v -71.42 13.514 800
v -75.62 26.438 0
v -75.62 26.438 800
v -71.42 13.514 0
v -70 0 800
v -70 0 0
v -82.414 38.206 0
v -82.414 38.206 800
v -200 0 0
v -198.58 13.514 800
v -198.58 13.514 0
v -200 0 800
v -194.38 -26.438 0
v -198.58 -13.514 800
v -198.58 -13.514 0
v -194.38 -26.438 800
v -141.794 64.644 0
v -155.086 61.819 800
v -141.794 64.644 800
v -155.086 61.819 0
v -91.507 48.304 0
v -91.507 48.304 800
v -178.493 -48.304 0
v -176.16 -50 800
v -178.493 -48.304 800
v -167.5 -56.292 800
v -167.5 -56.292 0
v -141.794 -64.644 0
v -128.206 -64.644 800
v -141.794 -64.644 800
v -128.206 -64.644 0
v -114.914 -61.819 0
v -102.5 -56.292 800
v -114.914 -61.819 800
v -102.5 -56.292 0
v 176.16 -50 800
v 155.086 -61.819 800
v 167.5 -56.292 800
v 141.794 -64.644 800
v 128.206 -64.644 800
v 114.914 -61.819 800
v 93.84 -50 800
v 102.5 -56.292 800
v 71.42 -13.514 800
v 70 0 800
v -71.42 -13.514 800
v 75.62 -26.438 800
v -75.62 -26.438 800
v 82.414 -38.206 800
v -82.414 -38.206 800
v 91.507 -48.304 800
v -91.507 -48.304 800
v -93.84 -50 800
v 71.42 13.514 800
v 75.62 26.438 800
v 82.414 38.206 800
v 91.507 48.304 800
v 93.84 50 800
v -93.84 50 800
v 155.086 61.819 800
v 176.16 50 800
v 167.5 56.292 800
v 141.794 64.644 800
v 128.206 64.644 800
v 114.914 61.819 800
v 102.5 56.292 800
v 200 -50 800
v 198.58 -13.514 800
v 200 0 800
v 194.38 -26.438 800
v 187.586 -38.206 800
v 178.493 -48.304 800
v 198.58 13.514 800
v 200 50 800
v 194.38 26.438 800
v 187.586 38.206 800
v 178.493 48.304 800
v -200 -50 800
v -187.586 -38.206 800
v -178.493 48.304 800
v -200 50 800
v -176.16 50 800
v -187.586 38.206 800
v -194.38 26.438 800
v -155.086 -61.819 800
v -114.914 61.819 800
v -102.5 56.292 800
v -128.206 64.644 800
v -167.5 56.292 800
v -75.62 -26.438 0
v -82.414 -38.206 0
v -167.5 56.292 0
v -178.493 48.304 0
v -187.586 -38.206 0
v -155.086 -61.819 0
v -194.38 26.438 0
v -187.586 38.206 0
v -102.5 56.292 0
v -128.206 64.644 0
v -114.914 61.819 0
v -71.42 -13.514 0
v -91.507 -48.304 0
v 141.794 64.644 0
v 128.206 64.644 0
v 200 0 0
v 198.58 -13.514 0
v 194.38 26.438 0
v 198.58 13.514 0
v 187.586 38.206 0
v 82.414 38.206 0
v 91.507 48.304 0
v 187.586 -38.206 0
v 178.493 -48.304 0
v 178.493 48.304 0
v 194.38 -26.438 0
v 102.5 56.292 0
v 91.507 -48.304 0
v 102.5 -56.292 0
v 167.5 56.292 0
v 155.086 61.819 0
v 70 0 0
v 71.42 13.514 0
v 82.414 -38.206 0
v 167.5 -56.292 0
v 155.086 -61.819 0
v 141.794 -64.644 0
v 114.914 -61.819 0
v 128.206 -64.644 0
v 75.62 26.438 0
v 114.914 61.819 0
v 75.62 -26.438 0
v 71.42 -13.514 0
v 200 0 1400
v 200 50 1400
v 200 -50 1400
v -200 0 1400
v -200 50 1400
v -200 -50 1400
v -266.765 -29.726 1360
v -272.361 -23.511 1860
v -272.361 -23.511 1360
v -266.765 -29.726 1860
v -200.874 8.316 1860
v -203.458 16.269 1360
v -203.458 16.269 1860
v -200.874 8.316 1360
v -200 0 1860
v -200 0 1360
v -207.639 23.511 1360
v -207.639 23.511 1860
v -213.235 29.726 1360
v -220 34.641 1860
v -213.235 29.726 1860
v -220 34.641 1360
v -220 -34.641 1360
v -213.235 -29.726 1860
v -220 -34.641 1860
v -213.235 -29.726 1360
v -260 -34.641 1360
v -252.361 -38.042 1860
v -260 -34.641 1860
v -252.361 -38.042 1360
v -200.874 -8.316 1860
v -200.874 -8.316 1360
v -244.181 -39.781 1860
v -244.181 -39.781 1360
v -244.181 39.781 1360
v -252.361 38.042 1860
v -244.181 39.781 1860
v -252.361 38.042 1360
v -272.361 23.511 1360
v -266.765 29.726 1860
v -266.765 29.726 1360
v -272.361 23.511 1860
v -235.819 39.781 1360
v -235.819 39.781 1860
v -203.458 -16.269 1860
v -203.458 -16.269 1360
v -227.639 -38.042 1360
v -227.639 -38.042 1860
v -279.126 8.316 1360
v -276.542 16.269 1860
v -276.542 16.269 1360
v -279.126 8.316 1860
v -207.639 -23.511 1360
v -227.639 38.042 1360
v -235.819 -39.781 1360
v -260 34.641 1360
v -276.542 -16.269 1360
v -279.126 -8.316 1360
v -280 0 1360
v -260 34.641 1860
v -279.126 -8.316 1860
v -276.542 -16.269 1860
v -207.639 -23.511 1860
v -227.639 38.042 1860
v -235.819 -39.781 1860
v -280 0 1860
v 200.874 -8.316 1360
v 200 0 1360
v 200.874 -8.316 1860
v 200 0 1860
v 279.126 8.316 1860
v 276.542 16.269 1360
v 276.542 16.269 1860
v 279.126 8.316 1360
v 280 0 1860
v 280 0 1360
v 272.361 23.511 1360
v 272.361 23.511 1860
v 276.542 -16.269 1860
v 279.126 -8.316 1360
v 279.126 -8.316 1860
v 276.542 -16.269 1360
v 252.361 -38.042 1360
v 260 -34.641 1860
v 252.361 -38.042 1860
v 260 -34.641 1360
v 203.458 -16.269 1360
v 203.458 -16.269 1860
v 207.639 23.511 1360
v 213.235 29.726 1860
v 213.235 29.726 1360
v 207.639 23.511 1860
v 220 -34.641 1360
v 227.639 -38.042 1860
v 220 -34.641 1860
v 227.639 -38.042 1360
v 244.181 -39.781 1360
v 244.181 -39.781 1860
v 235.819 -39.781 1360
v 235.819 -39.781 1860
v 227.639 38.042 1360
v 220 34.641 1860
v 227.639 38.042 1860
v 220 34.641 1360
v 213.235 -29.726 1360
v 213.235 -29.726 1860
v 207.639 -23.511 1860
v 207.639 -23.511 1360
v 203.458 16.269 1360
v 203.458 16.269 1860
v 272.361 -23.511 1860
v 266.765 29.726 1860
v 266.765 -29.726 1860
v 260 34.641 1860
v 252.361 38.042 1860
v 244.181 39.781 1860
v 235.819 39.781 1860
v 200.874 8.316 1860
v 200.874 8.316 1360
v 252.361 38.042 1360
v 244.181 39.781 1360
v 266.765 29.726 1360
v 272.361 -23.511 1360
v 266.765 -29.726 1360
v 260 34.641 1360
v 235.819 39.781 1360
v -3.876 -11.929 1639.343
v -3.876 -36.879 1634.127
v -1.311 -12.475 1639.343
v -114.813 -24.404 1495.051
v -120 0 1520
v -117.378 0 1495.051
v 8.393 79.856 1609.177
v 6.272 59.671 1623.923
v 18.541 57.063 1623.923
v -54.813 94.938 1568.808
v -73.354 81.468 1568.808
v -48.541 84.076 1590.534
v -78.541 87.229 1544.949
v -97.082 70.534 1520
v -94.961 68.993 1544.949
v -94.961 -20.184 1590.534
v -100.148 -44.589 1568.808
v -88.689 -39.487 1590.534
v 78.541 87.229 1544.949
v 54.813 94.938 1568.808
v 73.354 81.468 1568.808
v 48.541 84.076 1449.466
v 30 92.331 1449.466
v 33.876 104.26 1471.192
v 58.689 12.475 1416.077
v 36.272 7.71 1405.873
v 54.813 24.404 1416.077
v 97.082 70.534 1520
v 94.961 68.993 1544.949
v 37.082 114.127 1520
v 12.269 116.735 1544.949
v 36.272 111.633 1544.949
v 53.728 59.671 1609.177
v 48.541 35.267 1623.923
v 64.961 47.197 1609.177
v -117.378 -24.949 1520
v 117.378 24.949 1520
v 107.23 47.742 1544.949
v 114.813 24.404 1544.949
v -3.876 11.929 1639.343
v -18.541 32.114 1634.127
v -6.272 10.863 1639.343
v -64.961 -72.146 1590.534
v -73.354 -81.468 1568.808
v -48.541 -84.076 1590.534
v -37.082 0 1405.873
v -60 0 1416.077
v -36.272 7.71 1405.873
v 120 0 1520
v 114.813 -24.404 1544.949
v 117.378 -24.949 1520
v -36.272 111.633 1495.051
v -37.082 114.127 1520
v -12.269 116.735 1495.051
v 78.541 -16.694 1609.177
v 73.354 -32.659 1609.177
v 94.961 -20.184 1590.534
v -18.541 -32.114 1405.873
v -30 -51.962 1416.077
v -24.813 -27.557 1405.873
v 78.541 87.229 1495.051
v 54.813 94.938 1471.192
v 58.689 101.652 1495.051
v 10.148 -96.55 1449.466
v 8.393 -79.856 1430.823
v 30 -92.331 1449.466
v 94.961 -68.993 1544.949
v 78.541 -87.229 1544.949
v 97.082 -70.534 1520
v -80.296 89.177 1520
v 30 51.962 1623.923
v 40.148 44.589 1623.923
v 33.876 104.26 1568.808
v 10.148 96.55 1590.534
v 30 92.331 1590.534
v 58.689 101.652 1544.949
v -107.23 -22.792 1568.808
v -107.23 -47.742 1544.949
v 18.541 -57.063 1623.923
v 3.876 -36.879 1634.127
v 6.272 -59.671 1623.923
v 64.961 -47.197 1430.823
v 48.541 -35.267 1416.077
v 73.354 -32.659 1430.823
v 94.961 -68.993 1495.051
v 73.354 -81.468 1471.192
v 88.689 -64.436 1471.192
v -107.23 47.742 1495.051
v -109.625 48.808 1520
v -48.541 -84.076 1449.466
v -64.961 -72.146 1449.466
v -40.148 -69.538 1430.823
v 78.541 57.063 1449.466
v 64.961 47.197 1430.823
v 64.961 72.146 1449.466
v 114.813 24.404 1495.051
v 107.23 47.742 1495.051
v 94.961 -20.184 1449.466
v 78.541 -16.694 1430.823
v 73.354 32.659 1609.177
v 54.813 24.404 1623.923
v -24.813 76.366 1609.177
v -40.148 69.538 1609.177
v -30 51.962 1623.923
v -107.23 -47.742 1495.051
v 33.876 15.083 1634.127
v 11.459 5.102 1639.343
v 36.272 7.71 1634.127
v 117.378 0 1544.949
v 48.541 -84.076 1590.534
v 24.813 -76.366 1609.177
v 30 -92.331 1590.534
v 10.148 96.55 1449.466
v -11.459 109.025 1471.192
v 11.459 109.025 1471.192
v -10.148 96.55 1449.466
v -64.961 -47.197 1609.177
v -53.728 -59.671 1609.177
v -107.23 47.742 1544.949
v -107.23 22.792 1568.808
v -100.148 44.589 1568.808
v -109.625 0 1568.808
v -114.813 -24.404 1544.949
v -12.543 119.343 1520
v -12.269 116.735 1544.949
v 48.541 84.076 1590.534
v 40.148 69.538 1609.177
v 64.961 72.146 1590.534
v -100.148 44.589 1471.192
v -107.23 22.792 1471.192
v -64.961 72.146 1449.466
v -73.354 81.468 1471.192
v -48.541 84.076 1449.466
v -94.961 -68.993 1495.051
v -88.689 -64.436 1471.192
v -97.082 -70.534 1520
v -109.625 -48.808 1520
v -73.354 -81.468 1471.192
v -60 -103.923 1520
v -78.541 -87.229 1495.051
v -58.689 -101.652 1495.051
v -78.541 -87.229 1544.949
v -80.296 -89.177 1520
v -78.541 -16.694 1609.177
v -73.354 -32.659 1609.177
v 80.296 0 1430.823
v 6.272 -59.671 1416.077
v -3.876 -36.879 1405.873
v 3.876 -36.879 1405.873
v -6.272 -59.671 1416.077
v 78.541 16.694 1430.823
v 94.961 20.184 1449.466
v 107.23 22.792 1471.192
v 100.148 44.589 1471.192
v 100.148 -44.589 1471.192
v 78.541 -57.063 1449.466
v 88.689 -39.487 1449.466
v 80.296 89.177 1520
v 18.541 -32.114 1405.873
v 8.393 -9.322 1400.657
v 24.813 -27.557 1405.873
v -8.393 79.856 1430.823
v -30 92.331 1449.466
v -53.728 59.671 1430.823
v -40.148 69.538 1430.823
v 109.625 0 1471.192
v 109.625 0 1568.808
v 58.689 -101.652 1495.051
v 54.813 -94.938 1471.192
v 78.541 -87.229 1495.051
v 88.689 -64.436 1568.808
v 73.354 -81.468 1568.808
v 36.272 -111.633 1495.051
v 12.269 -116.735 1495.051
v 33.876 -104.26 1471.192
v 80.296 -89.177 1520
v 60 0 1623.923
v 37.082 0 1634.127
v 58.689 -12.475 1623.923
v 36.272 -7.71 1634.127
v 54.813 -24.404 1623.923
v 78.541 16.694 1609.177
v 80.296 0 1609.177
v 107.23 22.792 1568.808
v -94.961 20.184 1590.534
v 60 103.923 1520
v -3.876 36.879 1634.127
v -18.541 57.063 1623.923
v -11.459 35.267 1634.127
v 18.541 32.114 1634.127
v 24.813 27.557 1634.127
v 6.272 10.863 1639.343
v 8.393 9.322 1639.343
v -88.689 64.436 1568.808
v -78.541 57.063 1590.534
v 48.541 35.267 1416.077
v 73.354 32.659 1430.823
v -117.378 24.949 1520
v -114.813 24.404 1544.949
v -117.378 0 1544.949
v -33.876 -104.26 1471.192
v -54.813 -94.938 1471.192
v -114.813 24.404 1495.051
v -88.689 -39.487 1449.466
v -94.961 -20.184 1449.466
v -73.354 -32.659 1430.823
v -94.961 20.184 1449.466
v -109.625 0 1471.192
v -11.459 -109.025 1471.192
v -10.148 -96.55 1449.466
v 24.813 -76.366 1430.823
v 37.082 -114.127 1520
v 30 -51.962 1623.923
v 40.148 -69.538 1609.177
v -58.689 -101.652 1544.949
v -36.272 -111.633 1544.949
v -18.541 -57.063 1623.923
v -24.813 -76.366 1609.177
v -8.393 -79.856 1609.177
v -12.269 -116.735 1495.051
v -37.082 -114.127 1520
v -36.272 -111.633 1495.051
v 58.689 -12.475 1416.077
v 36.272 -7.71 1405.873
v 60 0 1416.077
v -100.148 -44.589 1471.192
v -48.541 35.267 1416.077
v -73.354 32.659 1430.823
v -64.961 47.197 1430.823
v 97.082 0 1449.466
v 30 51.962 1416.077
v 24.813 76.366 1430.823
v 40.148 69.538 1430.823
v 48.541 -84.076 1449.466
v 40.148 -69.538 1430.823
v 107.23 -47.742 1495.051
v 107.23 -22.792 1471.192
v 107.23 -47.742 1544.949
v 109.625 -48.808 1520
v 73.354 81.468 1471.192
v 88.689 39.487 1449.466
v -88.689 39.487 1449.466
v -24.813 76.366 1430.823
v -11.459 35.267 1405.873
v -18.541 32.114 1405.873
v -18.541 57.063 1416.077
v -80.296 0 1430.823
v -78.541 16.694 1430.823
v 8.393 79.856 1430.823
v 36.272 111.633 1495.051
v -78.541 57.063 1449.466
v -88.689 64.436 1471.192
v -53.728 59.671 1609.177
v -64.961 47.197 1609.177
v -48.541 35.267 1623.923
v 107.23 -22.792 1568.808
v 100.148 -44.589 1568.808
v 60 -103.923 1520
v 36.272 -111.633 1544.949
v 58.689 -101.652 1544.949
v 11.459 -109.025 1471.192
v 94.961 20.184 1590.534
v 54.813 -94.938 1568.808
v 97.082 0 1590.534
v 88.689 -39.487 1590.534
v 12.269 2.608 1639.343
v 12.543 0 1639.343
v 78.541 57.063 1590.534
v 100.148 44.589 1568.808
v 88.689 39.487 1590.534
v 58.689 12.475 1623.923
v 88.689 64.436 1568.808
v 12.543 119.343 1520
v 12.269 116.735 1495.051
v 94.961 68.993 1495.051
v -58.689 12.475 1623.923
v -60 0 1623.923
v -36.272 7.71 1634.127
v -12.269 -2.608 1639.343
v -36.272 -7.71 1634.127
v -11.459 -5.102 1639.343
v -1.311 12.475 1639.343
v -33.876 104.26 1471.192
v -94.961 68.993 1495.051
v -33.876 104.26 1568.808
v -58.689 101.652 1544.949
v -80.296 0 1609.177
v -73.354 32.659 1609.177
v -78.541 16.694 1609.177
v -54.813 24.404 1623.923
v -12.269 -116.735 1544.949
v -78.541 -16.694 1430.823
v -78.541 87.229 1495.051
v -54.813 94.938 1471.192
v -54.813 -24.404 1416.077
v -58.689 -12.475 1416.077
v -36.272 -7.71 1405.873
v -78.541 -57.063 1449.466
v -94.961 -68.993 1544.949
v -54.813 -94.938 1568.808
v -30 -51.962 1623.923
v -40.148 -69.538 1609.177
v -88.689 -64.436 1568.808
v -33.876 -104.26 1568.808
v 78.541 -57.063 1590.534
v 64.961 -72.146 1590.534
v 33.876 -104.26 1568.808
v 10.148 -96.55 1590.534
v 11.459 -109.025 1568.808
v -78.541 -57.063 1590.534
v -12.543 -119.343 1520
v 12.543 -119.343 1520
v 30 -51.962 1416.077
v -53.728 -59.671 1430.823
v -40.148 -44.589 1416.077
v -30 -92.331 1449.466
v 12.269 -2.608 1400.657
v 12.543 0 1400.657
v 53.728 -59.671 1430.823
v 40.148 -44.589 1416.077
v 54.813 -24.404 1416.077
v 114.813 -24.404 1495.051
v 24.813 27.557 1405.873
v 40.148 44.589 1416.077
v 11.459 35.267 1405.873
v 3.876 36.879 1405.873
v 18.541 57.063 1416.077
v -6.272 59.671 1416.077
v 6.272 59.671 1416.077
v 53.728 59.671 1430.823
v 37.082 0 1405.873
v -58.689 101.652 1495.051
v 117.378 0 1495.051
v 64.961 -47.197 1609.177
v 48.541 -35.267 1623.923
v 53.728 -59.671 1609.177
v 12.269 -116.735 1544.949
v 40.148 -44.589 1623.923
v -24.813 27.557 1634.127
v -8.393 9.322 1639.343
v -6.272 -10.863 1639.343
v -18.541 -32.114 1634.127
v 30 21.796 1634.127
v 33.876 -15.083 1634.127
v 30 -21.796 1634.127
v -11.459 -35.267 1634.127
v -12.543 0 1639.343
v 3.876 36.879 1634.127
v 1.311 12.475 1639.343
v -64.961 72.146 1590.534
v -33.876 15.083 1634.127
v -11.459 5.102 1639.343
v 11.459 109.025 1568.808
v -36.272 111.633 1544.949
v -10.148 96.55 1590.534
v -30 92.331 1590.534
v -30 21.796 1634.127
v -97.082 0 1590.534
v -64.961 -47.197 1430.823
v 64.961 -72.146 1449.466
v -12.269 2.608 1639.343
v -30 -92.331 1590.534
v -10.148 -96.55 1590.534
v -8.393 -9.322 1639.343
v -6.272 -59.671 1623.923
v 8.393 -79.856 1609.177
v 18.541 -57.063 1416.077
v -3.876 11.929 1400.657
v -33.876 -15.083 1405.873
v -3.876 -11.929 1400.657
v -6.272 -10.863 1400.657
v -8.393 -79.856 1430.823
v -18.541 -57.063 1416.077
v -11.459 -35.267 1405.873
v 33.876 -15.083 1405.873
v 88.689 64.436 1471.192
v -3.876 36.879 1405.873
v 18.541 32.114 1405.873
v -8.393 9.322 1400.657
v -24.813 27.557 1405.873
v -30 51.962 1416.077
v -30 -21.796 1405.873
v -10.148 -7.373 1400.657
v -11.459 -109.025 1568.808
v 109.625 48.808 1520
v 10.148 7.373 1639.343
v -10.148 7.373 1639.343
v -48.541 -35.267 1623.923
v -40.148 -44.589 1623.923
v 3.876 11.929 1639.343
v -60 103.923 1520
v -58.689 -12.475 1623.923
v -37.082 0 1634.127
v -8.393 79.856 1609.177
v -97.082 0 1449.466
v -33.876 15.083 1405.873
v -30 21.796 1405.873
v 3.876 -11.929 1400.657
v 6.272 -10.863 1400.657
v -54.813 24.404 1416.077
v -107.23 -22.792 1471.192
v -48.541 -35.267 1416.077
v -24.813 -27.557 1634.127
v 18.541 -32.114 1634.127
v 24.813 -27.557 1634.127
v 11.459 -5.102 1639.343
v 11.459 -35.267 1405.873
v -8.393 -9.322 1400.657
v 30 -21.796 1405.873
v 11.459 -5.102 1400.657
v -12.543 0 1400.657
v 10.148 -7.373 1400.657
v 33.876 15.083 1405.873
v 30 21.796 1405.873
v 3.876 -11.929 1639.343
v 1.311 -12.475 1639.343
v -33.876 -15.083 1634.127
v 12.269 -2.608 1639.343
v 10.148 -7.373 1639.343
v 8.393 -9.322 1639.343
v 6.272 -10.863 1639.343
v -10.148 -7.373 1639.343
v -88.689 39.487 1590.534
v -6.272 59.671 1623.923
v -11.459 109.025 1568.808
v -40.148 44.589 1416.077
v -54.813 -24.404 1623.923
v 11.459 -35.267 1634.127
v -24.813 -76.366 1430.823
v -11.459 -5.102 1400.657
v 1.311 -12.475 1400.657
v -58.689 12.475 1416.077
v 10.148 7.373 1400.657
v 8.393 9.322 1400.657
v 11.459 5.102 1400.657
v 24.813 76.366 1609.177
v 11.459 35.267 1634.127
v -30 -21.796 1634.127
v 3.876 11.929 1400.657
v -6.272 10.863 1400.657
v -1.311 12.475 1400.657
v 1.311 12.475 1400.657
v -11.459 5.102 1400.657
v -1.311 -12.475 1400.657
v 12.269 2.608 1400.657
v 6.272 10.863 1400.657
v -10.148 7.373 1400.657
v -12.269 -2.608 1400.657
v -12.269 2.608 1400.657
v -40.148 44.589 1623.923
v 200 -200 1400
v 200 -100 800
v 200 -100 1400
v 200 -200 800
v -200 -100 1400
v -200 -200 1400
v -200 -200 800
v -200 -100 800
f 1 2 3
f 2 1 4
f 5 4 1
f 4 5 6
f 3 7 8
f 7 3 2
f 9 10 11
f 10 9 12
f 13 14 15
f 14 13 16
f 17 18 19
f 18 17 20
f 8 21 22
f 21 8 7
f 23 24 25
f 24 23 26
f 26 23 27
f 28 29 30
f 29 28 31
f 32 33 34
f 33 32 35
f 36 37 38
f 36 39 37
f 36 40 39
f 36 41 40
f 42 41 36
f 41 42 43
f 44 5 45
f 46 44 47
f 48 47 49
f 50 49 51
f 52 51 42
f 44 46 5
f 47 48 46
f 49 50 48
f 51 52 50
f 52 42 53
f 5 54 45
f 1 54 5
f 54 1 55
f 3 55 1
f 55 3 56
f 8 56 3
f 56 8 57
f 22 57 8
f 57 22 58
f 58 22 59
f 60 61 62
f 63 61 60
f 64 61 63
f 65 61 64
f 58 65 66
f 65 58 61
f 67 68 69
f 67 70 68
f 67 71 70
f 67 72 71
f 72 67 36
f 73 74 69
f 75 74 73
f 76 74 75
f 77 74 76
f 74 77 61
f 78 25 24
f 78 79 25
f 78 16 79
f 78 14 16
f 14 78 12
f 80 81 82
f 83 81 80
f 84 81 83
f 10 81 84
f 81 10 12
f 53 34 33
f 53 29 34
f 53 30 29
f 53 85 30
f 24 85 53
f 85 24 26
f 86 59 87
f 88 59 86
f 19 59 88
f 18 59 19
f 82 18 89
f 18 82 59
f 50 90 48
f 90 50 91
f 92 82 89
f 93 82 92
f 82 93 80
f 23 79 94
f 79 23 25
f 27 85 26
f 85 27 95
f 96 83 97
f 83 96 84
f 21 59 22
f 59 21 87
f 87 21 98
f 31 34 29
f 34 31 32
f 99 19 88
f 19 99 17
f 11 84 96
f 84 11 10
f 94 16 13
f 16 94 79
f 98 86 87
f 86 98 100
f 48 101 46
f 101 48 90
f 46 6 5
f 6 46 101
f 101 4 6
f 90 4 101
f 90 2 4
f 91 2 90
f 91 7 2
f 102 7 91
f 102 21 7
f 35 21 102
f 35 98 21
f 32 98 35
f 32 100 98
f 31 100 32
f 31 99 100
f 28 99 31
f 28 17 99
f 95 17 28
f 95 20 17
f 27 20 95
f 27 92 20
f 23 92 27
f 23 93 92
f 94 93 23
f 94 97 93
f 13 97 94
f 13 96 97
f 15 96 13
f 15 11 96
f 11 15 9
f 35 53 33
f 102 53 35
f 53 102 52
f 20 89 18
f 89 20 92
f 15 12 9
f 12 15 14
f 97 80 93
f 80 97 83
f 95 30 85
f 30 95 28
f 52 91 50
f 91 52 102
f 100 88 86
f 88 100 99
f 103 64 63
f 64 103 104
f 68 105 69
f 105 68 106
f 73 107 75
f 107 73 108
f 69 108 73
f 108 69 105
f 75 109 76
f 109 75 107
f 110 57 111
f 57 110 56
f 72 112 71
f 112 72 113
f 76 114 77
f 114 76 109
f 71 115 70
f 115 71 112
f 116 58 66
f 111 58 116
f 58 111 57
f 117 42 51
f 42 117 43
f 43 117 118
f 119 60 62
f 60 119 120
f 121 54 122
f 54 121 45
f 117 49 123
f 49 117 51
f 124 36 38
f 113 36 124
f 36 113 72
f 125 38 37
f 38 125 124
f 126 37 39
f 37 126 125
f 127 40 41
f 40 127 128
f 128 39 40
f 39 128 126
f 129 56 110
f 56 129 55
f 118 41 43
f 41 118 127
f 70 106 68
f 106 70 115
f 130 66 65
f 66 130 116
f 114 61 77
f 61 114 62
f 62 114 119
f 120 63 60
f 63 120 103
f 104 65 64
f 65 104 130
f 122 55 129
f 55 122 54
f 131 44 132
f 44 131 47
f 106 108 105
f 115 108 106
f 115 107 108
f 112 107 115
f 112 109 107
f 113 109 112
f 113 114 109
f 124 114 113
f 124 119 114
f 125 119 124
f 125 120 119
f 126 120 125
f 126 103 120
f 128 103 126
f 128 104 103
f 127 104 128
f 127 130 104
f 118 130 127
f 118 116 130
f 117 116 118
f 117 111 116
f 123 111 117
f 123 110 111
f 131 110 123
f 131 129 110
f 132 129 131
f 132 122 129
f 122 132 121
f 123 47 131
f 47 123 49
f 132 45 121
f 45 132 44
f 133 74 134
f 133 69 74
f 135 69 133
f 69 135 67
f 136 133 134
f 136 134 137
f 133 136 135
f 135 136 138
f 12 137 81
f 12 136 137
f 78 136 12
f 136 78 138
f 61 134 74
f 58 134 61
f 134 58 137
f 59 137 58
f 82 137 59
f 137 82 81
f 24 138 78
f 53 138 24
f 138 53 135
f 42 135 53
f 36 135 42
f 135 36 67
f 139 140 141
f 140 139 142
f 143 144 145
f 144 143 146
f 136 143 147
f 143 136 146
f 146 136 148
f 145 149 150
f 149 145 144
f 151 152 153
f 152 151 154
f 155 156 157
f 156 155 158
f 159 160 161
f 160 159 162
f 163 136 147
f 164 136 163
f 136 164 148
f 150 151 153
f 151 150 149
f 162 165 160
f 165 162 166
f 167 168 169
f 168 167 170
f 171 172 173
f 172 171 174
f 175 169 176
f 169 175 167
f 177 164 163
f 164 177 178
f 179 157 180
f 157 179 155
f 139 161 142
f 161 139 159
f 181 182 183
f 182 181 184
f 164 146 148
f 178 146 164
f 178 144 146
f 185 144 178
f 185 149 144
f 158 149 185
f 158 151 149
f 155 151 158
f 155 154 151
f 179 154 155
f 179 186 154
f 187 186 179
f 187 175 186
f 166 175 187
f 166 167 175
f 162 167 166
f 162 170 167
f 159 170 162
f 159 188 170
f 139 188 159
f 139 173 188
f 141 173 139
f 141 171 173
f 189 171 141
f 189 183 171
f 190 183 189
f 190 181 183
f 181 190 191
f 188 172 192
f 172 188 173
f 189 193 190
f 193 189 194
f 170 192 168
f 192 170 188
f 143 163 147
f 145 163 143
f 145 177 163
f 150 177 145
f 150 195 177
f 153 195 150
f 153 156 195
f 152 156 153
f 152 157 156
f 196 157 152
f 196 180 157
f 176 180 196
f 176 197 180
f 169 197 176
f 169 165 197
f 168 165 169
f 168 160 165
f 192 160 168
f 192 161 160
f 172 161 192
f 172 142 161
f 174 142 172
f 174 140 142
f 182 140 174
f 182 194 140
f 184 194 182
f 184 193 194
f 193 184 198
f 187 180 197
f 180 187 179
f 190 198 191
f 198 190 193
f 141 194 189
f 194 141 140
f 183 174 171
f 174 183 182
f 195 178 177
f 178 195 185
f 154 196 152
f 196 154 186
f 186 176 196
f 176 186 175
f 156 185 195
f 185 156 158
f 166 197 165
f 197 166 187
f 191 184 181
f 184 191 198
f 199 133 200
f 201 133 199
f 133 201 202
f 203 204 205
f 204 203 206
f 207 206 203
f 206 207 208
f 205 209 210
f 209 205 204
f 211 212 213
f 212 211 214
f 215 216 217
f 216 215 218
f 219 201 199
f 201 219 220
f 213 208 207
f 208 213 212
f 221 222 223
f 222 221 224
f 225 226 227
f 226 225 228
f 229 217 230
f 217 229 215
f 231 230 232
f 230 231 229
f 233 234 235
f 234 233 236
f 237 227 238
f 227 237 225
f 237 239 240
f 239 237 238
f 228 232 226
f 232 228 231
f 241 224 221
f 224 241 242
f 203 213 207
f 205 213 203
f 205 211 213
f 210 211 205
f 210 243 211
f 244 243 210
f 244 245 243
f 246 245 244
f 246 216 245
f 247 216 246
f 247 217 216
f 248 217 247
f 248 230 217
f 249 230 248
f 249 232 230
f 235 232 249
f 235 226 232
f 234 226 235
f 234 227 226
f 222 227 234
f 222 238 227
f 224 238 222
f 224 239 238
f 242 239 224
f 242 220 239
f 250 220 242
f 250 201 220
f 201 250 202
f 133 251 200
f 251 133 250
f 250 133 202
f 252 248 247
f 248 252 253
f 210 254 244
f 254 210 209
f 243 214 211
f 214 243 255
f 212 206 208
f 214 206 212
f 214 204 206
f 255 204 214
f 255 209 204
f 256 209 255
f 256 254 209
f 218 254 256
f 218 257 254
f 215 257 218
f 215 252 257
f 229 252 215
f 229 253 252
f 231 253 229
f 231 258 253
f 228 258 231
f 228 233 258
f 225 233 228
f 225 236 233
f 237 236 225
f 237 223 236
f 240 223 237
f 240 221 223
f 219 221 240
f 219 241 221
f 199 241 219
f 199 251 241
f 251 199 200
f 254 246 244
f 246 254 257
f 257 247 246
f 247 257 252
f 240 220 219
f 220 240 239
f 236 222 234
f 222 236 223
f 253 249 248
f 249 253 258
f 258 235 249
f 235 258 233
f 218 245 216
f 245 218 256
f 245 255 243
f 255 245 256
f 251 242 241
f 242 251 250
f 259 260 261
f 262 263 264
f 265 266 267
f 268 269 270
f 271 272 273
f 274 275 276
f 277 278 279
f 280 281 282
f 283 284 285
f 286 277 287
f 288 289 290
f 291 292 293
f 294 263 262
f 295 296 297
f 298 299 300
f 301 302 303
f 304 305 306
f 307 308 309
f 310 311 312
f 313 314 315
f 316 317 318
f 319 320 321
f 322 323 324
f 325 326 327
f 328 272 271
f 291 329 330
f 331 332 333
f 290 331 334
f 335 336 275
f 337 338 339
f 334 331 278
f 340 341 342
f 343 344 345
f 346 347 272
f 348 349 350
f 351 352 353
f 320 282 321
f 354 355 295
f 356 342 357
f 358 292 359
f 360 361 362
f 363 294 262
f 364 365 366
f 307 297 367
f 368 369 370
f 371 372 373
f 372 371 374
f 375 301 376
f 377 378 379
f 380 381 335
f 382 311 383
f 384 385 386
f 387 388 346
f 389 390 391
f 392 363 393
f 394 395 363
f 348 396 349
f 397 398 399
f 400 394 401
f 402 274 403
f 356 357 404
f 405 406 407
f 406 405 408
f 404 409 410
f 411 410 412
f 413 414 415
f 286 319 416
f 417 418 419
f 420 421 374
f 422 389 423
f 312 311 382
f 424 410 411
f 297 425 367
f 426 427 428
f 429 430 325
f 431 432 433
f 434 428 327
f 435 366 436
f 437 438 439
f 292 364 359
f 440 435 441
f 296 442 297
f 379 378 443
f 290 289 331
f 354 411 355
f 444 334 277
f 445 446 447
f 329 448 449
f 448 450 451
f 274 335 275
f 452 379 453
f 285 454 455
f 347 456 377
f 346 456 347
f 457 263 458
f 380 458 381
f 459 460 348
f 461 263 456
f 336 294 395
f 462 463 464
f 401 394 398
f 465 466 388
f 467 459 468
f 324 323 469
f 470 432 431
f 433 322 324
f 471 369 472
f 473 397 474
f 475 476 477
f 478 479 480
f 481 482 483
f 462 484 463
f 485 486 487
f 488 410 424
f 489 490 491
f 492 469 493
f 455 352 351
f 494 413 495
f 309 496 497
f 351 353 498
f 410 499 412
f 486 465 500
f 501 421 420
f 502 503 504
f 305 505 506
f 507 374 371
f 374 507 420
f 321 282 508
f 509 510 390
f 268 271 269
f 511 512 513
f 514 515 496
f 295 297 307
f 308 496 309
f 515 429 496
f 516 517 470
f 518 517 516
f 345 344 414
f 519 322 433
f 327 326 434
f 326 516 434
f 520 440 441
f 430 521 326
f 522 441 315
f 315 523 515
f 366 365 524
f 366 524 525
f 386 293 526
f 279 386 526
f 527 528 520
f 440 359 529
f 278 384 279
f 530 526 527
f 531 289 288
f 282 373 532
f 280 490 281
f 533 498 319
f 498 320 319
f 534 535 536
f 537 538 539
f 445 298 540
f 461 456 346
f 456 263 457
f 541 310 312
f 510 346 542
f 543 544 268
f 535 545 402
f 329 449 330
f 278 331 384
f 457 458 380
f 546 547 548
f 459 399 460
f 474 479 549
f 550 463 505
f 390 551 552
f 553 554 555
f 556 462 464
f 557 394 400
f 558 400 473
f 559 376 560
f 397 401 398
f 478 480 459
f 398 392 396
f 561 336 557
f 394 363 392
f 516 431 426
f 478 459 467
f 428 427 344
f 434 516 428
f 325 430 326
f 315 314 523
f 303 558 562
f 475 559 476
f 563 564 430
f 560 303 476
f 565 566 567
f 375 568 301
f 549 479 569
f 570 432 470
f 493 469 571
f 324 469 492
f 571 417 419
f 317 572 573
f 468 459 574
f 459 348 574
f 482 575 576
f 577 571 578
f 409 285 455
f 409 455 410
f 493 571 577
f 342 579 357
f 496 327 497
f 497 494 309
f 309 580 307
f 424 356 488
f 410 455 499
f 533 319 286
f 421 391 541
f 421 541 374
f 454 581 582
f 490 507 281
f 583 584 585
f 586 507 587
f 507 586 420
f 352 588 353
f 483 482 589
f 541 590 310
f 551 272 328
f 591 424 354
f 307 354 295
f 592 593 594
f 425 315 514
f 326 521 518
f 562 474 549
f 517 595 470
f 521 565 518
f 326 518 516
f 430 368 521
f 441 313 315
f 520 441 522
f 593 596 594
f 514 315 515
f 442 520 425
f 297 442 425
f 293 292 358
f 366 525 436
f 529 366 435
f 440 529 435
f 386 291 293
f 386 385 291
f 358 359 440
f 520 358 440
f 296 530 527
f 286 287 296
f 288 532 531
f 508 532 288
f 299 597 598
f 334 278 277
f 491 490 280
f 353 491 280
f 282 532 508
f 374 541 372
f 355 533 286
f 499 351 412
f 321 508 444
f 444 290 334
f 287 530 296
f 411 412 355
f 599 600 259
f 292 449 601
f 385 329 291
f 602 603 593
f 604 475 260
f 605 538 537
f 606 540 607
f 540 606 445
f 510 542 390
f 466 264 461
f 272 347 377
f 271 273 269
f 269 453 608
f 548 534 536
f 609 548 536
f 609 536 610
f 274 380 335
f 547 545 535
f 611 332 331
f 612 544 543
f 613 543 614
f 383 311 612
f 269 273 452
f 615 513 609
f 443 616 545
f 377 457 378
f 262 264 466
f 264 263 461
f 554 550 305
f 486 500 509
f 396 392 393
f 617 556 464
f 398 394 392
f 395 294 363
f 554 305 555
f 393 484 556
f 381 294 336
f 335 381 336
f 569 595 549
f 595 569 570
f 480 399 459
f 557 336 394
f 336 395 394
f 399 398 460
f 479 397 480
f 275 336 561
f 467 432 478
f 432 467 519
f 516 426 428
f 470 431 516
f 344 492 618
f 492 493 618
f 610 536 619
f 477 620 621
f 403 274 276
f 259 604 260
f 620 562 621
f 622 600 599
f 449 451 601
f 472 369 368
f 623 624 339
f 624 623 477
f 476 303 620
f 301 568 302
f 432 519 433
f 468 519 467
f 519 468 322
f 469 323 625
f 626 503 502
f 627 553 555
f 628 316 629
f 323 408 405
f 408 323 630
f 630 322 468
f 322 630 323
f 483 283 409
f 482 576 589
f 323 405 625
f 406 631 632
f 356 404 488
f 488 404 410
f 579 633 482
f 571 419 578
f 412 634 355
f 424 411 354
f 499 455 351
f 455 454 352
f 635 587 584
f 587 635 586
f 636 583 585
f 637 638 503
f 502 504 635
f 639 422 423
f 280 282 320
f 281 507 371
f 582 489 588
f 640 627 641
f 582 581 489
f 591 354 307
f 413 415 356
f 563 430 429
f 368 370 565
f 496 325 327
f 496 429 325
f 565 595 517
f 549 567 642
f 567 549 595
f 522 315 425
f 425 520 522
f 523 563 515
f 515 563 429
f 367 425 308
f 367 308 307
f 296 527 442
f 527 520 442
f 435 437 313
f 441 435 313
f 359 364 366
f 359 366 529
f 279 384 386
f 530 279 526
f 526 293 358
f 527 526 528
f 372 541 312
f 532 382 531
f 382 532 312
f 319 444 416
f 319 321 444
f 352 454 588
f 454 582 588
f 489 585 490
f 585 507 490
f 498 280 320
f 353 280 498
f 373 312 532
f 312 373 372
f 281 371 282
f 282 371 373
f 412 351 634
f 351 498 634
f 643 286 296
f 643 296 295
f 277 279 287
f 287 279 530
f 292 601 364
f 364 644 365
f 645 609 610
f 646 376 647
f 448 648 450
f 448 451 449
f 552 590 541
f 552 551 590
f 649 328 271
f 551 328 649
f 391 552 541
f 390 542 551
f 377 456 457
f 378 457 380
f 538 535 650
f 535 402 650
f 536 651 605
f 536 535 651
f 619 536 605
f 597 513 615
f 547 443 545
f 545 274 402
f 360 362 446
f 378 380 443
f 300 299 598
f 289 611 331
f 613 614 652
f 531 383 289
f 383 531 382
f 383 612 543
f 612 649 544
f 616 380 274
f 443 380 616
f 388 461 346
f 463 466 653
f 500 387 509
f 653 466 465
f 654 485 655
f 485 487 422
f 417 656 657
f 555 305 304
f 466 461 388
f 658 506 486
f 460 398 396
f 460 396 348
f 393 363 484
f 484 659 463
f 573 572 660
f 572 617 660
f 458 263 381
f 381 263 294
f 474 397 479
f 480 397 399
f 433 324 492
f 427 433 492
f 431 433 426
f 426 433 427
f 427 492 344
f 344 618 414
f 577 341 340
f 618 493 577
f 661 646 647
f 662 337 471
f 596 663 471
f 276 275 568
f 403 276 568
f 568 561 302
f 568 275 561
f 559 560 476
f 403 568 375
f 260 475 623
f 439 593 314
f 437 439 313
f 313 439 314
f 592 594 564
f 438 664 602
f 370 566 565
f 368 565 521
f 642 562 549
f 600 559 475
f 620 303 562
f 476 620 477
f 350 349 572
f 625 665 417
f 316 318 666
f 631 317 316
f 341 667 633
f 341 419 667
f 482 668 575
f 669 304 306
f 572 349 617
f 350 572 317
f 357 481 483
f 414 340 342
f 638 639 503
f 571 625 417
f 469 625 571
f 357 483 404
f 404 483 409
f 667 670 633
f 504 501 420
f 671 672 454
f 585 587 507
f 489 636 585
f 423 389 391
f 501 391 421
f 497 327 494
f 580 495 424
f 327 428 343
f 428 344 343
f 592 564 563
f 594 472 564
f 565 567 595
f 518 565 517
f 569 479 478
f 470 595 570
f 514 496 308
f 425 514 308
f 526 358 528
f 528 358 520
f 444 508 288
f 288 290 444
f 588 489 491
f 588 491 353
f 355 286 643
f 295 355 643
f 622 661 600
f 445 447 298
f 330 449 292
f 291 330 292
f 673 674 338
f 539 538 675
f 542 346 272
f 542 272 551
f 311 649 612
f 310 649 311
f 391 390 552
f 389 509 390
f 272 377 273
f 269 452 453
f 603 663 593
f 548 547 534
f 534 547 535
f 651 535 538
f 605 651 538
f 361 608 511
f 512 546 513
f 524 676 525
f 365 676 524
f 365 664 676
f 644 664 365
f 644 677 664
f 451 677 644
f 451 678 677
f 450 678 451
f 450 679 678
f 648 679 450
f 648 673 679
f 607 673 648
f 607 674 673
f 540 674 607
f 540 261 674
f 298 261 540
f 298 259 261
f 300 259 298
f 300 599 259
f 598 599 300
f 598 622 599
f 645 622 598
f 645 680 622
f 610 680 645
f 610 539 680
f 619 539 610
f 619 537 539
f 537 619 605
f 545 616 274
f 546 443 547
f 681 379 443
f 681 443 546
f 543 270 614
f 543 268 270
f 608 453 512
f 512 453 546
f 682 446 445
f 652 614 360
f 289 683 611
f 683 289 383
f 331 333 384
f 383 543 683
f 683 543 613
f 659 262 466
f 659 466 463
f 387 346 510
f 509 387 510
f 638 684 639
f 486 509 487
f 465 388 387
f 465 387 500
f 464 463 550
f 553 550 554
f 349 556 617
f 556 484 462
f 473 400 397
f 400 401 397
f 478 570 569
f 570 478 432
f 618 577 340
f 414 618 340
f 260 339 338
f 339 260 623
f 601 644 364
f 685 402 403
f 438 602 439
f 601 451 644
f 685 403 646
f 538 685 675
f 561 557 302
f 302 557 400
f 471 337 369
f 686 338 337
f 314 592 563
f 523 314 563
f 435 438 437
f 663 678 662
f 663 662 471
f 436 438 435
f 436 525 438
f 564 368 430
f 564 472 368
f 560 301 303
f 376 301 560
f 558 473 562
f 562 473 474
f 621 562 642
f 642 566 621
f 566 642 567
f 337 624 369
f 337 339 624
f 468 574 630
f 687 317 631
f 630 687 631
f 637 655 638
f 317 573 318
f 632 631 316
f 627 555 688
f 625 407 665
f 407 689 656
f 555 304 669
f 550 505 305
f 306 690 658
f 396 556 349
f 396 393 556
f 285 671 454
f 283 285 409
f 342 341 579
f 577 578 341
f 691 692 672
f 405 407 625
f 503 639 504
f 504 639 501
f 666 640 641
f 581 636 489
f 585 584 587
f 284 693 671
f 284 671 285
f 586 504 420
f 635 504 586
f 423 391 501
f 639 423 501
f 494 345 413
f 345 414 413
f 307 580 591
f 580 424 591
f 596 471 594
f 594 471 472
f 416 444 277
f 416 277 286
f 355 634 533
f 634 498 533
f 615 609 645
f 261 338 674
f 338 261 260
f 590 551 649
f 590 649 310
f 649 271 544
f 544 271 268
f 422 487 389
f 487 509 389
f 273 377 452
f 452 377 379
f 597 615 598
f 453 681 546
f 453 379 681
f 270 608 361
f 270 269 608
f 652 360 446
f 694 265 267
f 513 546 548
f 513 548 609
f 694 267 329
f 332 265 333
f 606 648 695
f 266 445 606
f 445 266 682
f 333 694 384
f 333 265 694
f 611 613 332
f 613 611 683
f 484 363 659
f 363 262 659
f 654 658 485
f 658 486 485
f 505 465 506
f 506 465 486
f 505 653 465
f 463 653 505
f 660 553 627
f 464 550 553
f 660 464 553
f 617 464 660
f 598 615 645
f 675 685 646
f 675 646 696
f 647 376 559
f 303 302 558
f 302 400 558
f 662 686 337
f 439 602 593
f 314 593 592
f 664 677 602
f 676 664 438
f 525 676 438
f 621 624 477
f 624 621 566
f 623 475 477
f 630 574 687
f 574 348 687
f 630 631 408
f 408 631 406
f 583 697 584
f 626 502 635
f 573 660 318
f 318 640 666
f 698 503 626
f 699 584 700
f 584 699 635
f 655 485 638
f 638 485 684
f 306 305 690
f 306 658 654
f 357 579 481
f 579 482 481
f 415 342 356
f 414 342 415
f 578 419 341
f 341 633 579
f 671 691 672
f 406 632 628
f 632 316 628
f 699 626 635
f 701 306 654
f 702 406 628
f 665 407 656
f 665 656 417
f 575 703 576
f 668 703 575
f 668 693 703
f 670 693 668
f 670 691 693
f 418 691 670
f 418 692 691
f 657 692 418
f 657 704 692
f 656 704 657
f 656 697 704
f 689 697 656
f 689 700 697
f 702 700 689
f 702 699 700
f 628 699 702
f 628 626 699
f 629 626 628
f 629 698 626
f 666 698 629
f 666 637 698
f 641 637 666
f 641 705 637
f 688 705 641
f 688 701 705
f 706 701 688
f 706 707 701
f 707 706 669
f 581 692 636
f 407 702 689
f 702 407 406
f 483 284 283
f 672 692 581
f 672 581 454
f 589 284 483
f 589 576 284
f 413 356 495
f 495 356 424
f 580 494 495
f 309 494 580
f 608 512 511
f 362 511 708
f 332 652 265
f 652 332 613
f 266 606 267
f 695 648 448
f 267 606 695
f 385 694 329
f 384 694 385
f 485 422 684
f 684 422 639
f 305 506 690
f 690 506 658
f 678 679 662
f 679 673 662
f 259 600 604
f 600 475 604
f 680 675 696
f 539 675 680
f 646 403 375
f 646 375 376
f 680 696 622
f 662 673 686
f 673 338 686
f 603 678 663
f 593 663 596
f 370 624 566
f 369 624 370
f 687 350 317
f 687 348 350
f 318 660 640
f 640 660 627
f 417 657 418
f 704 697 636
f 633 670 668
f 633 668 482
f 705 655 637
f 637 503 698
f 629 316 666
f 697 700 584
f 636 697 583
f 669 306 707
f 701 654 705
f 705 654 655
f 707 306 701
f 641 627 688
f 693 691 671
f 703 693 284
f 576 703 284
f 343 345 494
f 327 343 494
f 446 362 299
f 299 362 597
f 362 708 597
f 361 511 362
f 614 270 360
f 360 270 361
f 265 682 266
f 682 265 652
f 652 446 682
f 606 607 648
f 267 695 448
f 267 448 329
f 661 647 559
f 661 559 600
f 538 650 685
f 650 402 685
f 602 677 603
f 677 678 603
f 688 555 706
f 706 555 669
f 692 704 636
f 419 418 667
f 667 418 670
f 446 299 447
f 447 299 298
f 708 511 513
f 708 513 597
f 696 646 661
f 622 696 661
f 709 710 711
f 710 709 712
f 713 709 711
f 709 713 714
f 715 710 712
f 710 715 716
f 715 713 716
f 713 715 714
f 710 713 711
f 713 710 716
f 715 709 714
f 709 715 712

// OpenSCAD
// file: human_params.scad
head_radius = 120;

leg_radius = 65;
leg_length = 800;

body_height = 600;
body_width = 400;
body_thickness = 100;

hand_radius = 40;
hand_length = 500;
// main file
// human in OpenSCAD

// Author: Mihai Oltean, https://mihaioltean.github.io, mihai.oltean@gmail.com
// Source code: https://github.com/mihaioltean/pufu
// License: MIT

// all sizes are in millimeters

//------------------------------------------------------------------------
include <human_params.scad>
//------------------------------------------------------------------------
module leg()
{
    cylinder(h = leg_length, r = leg_radius);
}
//------------------------------------------------------------------------
module body()
{
    translate ([-body_width / 2, -body_thickness / 2, 0])
        cube([body_width, body_thickness, body_height]);
}
//------------------------------------------------------------------------
module hand()
{
    cylinder(h = hand_length, r = hand_radius);    
}
//------------------------------------------------------------------------
module head()
{
    sphere(r = head_radius);
}
//------------------------------------------------------------------------
module back_pack()
{
    color("green")
        cube ([body_width, body_thickness, body_height]);
}
//------------------------------------------------------------------------
module human()
{
    translate ([-(body_width / 2 - leg_radius), 0, 0]) leg();
    translate ([(body_width / 2 - leg_radius), 0, 0])  leg();
    translate ([0, 0, leg_length]) body();
    translate([-(body_width / 2 + hand_radius), 0, leg_length + body_height - hand_radius]) hand();
    translate([(body_width / 2 + hand_radius), 0, leg_length + body_height - hand_radius]) hand();
    translate ([0, 0, leg_length + body_height + head_radius]) head();
}
//------------------------------------------------------------------------
module human_with_back_pack()
{
    human();
    translate ([-body_width / 2, -2 * body_thickness, leg_length]) back_pack();
}
//------------------------------------------------------------------------
human_with_back_pack();
